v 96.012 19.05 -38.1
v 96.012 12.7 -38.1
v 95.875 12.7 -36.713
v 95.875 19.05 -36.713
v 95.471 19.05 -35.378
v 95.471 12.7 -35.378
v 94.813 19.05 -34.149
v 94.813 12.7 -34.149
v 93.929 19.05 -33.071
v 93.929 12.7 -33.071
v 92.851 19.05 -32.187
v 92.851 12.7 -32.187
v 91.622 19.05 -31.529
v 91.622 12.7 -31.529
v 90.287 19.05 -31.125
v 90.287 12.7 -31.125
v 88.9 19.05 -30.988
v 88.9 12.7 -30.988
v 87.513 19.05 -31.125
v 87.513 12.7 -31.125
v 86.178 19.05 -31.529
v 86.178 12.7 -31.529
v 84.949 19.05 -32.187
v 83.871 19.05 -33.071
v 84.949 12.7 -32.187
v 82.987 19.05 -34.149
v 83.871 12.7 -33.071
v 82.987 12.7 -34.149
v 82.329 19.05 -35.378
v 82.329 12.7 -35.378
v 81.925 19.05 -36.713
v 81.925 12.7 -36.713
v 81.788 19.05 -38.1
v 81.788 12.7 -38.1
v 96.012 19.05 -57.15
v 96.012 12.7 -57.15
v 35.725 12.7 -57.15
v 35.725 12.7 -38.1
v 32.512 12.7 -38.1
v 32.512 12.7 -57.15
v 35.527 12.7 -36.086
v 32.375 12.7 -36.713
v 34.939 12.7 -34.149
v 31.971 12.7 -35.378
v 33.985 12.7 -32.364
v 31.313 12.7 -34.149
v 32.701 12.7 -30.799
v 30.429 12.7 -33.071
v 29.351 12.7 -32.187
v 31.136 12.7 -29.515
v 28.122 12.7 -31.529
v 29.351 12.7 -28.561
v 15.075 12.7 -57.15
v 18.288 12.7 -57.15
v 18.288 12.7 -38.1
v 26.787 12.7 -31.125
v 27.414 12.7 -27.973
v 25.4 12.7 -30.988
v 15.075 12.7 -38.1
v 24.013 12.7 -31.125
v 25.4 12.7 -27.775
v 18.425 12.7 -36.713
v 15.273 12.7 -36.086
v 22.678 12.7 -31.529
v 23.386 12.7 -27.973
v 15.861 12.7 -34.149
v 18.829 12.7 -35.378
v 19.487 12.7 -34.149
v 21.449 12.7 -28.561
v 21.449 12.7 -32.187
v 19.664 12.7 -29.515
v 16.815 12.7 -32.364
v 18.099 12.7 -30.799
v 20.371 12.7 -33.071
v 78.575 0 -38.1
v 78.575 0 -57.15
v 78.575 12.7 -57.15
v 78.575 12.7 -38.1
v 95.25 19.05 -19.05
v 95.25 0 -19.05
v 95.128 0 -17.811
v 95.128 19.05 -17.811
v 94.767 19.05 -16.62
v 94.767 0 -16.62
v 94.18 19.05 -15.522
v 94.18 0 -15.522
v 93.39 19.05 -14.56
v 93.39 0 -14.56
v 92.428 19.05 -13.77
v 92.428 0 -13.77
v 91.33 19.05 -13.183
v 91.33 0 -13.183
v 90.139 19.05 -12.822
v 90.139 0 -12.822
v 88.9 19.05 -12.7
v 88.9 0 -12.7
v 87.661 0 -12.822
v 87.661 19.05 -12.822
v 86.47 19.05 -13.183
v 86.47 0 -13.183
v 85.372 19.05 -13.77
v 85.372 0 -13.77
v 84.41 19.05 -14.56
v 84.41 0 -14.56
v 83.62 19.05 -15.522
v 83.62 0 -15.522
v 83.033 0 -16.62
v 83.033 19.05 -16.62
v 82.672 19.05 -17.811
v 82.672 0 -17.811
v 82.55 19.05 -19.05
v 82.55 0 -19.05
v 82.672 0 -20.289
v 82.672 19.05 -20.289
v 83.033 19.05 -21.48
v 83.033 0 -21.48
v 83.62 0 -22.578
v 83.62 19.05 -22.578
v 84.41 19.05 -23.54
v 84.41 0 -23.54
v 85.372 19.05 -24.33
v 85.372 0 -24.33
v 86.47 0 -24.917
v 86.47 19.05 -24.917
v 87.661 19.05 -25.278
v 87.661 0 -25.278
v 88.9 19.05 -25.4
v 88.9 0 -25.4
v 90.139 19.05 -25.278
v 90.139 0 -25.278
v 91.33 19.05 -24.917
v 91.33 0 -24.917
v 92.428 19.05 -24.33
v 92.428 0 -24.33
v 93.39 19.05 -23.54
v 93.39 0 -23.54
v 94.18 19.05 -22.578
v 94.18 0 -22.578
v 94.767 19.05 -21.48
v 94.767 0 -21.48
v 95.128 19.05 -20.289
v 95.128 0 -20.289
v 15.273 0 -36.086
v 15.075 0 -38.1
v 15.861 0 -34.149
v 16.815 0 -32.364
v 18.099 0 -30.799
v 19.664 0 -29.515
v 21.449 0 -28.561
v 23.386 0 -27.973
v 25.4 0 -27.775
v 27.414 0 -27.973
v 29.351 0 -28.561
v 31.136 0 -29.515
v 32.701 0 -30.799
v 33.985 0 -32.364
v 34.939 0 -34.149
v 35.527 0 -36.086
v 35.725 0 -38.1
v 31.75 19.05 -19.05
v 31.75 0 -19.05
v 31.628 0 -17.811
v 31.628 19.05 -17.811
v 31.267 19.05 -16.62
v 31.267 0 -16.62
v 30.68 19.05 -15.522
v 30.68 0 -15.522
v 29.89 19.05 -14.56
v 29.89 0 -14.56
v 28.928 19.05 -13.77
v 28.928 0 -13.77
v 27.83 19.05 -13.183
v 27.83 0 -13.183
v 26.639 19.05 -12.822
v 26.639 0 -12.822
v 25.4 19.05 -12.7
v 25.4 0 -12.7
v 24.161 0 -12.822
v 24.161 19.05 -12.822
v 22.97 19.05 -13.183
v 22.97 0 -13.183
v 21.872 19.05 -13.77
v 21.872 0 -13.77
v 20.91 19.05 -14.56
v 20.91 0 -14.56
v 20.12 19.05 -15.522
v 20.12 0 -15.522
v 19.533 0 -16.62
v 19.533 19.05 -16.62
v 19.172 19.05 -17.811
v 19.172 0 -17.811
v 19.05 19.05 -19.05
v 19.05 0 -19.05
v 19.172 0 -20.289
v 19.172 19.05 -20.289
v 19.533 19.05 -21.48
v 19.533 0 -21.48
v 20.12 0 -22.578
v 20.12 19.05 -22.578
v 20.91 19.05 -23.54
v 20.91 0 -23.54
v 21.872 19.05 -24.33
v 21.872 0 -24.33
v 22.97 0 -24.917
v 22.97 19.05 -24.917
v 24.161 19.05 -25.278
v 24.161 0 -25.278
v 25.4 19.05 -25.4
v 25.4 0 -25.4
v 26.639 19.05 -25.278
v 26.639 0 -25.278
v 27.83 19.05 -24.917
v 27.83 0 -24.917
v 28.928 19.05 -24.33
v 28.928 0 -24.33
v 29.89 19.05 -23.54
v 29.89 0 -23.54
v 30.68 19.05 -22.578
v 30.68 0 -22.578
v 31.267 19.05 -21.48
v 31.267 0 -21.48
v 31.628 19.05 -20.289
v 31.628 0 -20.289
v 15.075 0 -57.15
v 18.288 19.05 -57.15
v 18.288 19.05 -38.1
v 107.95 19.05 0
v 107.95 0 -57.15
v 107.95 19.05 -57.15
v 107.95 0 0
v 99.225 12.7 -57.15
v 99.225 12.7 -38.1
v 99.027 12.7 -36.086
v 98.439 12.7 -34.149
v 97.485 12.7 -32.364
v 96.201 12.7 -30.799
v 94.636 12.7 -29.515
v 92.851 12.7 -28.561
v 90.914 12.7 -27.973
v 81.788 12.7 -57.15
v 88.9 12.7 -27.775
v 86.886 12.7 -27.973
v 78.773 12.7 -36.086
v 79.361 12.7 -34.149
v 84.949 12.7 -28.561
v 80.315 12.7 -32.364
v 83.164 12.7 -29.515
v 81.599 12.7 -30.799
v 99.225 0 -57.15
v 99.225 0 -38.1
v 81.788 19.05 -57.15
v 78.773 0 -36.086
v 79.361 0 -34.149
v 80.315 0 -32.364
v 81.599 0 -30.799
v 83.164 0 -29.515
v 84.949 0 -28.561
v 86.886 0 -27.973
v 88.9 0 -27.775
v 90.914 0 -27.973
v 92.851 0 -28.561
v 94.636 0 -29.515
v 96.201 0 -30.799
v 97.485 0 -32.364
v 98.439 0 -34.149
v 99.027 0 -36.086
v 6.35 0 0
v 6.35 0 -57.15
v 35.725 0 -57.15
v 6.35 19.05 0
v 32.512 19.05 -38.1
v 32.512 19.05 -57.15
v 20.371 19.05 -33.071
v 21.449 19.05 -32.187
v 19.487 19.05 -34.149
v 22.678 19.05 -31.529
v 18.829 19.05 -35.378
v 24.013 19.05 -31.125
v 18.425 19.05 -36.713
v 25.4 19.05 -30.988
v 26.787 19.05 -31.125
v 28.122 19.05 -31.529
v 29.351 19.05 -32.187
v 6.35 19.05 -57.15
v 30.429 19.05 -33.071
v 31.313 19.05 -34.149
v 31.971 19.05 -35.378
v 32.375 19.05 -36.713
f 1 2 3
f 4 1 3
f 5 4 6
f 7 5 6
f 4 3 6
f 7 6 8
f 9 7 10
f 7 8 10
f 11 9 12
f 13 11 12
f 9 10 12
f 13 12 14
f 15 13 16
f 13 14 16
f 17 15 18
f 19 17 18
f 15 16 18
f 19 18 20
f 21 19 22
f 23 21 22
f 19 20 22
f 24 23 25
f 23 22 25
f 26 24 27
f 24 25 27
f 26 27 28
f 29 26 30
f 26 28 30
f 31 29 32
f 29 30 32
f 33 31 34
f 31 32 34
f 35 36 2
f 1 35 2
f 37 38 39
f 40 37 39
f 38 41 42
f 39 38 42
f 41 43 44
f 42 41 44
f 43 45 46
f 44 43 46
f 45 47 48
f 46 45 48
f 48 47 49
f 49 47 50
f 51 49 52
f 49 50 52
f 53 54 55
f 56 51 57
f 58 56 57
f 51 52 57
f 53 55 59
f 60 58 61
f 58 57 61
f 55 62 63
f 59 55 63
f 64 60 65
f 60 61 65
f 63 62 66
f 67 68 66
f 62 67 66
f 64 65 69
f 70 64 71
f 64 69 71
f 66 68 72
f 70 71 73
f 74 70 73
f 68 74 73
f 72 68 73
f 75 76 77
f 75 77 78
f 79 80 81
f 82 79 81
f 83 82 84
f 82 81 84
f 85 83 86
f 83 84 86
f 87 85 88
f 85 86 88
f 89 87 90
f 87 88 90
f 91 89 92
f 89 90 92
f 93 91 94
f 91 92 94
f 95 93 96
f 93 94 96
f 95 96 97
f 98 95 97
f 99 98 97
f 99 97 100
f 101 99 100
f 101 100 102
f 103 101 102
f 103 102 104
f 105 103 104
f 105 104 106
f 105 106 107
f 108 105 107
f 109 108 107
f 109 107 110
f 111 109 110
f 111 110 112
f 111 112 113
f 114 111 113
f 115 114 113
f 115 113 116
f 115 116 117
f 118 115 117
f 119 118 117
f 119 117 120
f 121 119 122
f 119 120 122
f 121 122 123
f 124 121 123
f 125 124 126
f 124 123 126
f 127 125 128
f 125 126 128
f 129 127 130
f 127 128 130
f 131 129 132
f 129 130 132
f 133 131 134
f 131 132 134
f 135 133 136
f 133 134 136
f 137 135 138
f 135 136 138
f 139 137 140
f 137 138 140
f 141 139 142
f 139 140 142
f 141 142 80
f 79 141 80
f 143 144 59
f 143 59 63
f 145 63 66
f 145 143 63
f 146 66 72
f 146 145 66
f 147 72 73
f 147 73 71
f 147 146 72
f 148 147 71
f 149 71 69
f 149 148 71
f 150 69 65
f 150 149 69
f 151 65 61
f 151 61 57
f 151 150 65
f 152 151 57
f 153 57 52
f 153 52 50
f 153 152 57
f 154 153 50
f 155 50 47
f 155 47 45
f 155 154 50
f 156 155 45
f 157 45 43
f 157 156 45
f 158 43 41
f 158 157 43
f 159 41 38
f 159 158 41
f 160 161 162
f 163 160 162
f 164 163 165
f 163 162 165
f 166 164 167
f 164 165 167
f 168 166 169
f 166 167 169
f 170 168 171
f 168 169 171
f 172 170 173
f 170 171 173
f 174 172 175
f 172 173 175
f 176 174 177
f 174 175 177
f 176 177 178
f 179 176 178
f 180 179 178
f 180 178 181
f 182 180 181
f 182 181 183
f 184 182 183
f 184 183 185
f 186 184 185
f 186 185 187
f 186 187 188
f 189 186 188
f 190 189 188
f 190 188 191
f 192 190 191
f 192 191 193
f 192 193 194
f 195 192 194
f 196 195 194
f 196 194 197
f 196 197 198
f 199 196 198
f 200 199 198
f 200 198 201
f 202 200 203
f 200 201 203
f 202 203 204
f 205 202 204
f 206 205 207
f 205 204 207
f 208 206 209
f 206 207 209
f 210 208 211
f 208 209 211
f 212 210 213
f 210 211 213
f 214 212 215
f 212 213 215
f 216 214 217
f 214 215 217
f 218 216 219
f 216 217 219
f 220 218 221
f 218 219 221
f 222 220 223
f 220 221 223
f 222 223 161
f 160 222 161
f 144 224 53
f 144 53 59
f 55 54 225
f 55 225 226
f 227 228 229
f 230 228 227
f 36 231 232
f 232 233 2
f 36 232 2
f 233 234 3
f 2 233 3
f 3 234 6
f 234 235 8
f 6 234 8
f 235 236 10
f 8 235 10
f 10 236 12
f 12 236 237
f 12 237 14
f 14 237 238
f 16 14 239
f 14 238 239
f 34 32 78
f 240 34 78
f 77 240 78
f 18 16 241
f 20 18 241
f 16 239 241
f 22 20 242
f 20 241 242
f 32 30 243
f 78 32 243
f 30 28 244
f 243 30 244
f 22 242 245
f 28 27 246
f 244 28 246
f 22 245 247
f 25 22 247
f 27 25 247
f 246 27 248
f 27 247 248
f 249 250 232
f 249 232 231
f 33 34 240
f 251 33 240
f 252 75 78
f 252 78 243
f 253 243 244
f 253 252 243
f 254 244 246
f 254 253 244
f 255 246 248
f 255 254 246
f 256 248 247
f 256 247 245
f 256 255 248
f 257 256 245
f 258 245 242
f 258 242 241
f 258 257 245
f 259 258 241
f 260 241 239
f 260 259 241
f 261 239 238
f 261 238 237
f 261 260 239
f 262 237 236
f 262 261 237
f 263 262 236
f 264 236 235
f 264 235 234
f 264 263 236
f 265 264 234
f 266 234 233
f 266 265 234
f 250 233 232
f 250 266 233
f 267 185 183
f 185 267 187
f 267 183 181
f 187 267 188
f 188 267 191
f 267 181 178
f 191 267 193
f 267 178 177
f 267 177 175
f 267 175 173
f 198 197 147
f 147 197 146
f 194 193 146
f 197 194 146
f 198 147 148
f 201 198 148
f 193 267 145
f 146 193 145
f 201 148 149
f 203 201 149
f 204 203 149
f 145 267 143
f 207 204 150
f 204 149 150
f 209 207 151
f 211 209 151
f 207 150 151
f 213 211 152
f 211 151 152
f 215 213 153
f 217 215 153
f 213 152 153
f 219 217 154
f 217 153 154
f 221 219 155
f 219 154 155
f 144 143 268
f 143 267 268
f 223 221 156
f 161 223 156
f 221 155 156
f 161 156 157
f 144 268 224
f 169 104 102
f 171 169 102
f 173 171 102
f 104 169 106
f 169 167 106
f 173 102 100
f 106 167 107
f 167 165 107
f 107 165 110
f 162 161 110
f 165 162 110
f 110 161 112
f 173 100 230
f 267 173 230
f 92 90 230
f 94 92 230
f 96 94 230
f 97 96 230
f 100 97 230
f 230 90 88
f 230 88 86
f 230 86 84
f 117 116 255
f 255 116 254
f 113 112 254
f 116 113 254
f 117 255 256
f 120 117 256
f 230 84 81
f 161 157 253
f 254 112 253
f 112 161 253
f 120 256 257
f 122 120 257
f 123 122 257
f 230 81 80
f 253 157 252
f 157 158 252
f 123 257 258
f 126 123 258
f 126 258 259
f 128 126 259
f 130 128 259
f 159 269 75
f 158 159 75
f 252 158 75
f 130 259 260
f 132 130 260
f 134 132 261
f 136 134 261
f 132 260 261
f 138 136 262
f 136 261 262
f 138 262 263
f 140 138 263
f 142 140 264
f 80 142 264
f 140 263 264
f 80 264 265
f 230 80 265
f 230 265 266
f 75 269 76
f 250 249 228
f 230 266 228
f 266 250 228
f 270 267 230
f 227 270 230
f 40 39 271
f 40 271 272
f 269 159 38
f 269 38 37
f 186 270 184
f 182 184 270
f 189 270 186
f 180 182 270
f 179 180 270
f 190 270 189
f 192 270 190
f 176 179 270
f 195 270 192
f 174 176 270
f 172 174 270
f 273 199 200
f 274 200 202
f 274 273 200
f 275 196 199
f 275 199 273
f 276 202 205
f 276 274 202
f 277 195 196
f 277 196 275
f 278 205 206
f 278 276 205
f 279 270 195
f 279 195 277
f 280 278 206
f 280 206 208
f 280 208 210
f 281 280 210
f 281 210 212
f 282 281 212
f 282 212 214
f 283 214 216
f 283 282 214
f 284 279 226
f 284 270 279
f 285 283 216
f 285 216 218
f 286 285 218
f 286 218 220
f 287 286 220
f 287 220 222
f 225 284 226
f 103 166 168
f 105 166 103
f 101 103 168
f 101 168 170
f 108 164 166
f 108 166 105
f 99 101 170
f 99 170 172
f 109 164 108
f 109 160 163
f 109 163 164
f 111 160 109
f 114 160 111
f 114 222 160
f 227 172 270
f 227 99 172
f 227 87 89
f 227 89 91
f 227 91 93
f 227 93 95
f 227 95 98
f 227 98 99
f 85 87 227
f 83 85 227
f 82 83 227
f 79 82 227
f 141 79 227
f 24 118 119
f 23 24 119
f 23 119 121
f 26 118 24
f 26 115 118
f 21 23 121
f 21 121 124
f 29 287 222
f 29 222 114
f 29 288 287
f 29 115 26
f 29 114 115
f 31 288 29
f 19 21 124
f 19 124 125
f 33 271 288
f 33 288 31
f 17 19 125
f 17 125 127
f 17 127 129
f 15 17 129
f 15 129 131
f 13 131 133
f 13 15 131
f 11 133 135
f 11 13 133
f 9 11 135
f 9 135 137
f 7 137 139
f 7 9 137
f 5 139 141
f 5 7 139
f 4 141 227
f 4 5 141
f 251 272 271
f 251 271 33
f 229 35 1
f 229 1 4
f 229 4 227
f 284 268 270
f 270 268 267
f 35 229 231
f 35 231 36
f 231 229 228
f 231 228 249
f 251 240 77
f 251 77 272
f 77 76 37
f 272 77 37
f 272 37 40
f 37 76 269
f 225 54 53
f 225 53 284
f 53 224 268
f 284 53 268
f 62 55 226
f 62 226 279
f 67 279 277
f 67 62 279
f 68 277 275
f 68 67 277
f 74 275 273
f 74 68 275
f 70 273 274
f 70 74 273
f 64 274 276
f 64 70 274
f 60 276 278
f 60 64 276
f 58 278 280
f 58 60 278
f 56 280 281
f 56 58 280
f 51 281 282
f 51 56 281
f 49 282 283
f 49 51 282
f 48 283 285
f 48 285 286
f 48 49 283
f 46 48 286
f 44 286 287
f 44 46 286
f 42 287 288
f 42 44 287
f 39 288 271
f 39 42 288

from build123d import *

# Parameters (mm, degrees)
SKETCH1_W               = 114.3
SKETCH1_H               = 76.2
BASE_EXTRUDE_DEPTH      = 19.05
F_1_2_20_TAPPED_HOLE1_D = 12.7
CUT_EXTRUDE1_DEPTH      = 12.7
CUT_EXTRUDE2_DEPTH      = 12.7
SKETCH7_W               = 6.35
SKETCH7_H               = 76.2
CUT_EXTRUDE3_DEPTH      = 1
CUT_EXTRUDE3_DEPTH_BACK = 20.05
SKETCH8_W               = 6.35
SKETCH8_H               = 76.2
CUT_EXTRUDE4_DEPTH      = 1
CUT_EXTRUDE4_DEPTH_BACK = 20.05
CUT_EXTRUDE5_DEPTH      = 1
CUT_EXTRUDE5_DEPTH_BACK = 20.05


with BuildPart() as part:
    # Sketch1 → Base-Extrude (new body)
    with BuildSketch(Plane(origin=(0, 0, 0), x_dir=(1, 0, 0), z_dir=(0, 1, 0))):
        with Locations((57.15, 38.1)):
            Rectangle(SKETCH1_W, SKETCH1_H)
        with BuildLine():
            Line((96.012, 63.5), (96.012, 38.1))
            ThreePointArc((96.012, 38.1), (88.9, 30.988), (81.788, 38.1))
            Line((81.788, 38.1), (81.788, 63.5))
            ThreePointArc((81.788, 63.5), (88.9, 70.612), (96.012, 63.5))
        make_face(mode=Mode.SUBTRACT)
        with BuildLine():
            Line((18.288, 63.5), (18.288, 38.1))
            ThreePointArc((18.288, 38.1), (25.4, 30.988), (32.512, 38.1))
            Line((32.512, 38.1), (32.512, 63.5))
            ThreePointArc((32.512, 63.5), (25.4, 70.612), (18.288, 63.5))
        make_face(mode=Mode.SUBTRACT)
    extrude(amount=BASE_EXTRUDE_DEPTH)

    # 1/2-20 Tapped Hole1 (through all)
    with Locations(Plane(origin=(0, 19.05, 0), x_dir=(-1, 0, 0), z_dir=(0, 1, 0))):
        with Locations((-25.4, -19.05), (-88.9, -19.05)):
            Hole(F_1_2_20_TAPPED_HOLE1_D / 2)

    # Sketch4 → Cut-Extrude1 (cut)
    with BuildSketch(Plane.XZ):
        with BuildLine():
            Line((15.0749, -63.5), (15.0749, -38.1))
            ThreePointArc((15.0749, -38.1), (25.4, -27.7749), (35.7251, -38.1))
            Line((35.7251, -38.1), (35.7251, -63.5))
            ThreePointArc((35.7251, -63.5), (25.4, -73.8251), (15.0749, -63.5))
        make_face()
    extrude(amount=-CUT_EXTRUDE1_DEPTH, mode=Mode.SUBTRACT)

    # Sketch5 → Cut-Extrude2 (cut)
    with BuildSketch(Plane.XZ):
        with BuildLine():
            Line((99.2251, -38.1), (99.2251, -63.5))
            ThreePointArc((99.2251, -63.5), (88.9, -73.8251), (78.5749, -63.5))
            Line((78.5749, -63.5), (78.5749, -38.1))
            ThreePointArc((78.5749, -38.1), (88.9, -27.7749), (99.2251, -38.1))
        make_face()
    extrude(amount=-CUT_EXTRUDE2_DEPTH, mode=Mode.SUBTRACT)

    # Sketch7 → Cut-Extrude3 (cut, two sides)
    with BuildSketch(Plane.XZ) as cut_extrude3_sk:
        with Locations((111.125, -38.1)):
            Rectangle(SKETCH7_W, SKETCH7_H)
    extrude(amount=CUT_EXTRUDE3_DEPTH, mode=Mode.SUBTRACT)
    extrude(cut_extrude3_sk.sketch, amount=-CUT_EXTRUDE3_DEPTH_BACK, mode=Mode.SUBTRACT)

    # Sketch8 → Cut-Extrude4 (cut, two sides)
    with BuildSketch(Plane.XZ) as cut_extrude4_sk:
        with Locations((3.175, -38.1)):
            Rectangle(SKETCH8_W, SKETCH8_H)
    extrude(amount=CUT_EXTRUDE4_DEPTH, mode=Mode.SUBTRACT)
    extrude(cut_extrude4_sk.sketch, amount=-CUT_EXTRUDE4_DEPTH_BACK, mode=Mode.SUBTRACT)

    # Sketch9 → Cut-Extrude5 (cut, two sides)
    with BuildSketch(Plane.XZ) as cut_extrude5_sk:
        Polygon((351.091008834, -57.15), (107.95, -57.15), (6.35, -57.15), (-236.791008834, -57.15), (-236.791008834, -543.432017667), (351.091008834, -543.432017667), align=None)
    extrude(amount=CUT_EXTRUDE5_DEPTH, mode=Mode.SUBTRACT)
    extrude(cut_extrude5_sk.sketch, amount=-CUT_EXTRUDE5_DEPTH_BACK, mode=Mode.SUBTRACT)


solid = part.part
